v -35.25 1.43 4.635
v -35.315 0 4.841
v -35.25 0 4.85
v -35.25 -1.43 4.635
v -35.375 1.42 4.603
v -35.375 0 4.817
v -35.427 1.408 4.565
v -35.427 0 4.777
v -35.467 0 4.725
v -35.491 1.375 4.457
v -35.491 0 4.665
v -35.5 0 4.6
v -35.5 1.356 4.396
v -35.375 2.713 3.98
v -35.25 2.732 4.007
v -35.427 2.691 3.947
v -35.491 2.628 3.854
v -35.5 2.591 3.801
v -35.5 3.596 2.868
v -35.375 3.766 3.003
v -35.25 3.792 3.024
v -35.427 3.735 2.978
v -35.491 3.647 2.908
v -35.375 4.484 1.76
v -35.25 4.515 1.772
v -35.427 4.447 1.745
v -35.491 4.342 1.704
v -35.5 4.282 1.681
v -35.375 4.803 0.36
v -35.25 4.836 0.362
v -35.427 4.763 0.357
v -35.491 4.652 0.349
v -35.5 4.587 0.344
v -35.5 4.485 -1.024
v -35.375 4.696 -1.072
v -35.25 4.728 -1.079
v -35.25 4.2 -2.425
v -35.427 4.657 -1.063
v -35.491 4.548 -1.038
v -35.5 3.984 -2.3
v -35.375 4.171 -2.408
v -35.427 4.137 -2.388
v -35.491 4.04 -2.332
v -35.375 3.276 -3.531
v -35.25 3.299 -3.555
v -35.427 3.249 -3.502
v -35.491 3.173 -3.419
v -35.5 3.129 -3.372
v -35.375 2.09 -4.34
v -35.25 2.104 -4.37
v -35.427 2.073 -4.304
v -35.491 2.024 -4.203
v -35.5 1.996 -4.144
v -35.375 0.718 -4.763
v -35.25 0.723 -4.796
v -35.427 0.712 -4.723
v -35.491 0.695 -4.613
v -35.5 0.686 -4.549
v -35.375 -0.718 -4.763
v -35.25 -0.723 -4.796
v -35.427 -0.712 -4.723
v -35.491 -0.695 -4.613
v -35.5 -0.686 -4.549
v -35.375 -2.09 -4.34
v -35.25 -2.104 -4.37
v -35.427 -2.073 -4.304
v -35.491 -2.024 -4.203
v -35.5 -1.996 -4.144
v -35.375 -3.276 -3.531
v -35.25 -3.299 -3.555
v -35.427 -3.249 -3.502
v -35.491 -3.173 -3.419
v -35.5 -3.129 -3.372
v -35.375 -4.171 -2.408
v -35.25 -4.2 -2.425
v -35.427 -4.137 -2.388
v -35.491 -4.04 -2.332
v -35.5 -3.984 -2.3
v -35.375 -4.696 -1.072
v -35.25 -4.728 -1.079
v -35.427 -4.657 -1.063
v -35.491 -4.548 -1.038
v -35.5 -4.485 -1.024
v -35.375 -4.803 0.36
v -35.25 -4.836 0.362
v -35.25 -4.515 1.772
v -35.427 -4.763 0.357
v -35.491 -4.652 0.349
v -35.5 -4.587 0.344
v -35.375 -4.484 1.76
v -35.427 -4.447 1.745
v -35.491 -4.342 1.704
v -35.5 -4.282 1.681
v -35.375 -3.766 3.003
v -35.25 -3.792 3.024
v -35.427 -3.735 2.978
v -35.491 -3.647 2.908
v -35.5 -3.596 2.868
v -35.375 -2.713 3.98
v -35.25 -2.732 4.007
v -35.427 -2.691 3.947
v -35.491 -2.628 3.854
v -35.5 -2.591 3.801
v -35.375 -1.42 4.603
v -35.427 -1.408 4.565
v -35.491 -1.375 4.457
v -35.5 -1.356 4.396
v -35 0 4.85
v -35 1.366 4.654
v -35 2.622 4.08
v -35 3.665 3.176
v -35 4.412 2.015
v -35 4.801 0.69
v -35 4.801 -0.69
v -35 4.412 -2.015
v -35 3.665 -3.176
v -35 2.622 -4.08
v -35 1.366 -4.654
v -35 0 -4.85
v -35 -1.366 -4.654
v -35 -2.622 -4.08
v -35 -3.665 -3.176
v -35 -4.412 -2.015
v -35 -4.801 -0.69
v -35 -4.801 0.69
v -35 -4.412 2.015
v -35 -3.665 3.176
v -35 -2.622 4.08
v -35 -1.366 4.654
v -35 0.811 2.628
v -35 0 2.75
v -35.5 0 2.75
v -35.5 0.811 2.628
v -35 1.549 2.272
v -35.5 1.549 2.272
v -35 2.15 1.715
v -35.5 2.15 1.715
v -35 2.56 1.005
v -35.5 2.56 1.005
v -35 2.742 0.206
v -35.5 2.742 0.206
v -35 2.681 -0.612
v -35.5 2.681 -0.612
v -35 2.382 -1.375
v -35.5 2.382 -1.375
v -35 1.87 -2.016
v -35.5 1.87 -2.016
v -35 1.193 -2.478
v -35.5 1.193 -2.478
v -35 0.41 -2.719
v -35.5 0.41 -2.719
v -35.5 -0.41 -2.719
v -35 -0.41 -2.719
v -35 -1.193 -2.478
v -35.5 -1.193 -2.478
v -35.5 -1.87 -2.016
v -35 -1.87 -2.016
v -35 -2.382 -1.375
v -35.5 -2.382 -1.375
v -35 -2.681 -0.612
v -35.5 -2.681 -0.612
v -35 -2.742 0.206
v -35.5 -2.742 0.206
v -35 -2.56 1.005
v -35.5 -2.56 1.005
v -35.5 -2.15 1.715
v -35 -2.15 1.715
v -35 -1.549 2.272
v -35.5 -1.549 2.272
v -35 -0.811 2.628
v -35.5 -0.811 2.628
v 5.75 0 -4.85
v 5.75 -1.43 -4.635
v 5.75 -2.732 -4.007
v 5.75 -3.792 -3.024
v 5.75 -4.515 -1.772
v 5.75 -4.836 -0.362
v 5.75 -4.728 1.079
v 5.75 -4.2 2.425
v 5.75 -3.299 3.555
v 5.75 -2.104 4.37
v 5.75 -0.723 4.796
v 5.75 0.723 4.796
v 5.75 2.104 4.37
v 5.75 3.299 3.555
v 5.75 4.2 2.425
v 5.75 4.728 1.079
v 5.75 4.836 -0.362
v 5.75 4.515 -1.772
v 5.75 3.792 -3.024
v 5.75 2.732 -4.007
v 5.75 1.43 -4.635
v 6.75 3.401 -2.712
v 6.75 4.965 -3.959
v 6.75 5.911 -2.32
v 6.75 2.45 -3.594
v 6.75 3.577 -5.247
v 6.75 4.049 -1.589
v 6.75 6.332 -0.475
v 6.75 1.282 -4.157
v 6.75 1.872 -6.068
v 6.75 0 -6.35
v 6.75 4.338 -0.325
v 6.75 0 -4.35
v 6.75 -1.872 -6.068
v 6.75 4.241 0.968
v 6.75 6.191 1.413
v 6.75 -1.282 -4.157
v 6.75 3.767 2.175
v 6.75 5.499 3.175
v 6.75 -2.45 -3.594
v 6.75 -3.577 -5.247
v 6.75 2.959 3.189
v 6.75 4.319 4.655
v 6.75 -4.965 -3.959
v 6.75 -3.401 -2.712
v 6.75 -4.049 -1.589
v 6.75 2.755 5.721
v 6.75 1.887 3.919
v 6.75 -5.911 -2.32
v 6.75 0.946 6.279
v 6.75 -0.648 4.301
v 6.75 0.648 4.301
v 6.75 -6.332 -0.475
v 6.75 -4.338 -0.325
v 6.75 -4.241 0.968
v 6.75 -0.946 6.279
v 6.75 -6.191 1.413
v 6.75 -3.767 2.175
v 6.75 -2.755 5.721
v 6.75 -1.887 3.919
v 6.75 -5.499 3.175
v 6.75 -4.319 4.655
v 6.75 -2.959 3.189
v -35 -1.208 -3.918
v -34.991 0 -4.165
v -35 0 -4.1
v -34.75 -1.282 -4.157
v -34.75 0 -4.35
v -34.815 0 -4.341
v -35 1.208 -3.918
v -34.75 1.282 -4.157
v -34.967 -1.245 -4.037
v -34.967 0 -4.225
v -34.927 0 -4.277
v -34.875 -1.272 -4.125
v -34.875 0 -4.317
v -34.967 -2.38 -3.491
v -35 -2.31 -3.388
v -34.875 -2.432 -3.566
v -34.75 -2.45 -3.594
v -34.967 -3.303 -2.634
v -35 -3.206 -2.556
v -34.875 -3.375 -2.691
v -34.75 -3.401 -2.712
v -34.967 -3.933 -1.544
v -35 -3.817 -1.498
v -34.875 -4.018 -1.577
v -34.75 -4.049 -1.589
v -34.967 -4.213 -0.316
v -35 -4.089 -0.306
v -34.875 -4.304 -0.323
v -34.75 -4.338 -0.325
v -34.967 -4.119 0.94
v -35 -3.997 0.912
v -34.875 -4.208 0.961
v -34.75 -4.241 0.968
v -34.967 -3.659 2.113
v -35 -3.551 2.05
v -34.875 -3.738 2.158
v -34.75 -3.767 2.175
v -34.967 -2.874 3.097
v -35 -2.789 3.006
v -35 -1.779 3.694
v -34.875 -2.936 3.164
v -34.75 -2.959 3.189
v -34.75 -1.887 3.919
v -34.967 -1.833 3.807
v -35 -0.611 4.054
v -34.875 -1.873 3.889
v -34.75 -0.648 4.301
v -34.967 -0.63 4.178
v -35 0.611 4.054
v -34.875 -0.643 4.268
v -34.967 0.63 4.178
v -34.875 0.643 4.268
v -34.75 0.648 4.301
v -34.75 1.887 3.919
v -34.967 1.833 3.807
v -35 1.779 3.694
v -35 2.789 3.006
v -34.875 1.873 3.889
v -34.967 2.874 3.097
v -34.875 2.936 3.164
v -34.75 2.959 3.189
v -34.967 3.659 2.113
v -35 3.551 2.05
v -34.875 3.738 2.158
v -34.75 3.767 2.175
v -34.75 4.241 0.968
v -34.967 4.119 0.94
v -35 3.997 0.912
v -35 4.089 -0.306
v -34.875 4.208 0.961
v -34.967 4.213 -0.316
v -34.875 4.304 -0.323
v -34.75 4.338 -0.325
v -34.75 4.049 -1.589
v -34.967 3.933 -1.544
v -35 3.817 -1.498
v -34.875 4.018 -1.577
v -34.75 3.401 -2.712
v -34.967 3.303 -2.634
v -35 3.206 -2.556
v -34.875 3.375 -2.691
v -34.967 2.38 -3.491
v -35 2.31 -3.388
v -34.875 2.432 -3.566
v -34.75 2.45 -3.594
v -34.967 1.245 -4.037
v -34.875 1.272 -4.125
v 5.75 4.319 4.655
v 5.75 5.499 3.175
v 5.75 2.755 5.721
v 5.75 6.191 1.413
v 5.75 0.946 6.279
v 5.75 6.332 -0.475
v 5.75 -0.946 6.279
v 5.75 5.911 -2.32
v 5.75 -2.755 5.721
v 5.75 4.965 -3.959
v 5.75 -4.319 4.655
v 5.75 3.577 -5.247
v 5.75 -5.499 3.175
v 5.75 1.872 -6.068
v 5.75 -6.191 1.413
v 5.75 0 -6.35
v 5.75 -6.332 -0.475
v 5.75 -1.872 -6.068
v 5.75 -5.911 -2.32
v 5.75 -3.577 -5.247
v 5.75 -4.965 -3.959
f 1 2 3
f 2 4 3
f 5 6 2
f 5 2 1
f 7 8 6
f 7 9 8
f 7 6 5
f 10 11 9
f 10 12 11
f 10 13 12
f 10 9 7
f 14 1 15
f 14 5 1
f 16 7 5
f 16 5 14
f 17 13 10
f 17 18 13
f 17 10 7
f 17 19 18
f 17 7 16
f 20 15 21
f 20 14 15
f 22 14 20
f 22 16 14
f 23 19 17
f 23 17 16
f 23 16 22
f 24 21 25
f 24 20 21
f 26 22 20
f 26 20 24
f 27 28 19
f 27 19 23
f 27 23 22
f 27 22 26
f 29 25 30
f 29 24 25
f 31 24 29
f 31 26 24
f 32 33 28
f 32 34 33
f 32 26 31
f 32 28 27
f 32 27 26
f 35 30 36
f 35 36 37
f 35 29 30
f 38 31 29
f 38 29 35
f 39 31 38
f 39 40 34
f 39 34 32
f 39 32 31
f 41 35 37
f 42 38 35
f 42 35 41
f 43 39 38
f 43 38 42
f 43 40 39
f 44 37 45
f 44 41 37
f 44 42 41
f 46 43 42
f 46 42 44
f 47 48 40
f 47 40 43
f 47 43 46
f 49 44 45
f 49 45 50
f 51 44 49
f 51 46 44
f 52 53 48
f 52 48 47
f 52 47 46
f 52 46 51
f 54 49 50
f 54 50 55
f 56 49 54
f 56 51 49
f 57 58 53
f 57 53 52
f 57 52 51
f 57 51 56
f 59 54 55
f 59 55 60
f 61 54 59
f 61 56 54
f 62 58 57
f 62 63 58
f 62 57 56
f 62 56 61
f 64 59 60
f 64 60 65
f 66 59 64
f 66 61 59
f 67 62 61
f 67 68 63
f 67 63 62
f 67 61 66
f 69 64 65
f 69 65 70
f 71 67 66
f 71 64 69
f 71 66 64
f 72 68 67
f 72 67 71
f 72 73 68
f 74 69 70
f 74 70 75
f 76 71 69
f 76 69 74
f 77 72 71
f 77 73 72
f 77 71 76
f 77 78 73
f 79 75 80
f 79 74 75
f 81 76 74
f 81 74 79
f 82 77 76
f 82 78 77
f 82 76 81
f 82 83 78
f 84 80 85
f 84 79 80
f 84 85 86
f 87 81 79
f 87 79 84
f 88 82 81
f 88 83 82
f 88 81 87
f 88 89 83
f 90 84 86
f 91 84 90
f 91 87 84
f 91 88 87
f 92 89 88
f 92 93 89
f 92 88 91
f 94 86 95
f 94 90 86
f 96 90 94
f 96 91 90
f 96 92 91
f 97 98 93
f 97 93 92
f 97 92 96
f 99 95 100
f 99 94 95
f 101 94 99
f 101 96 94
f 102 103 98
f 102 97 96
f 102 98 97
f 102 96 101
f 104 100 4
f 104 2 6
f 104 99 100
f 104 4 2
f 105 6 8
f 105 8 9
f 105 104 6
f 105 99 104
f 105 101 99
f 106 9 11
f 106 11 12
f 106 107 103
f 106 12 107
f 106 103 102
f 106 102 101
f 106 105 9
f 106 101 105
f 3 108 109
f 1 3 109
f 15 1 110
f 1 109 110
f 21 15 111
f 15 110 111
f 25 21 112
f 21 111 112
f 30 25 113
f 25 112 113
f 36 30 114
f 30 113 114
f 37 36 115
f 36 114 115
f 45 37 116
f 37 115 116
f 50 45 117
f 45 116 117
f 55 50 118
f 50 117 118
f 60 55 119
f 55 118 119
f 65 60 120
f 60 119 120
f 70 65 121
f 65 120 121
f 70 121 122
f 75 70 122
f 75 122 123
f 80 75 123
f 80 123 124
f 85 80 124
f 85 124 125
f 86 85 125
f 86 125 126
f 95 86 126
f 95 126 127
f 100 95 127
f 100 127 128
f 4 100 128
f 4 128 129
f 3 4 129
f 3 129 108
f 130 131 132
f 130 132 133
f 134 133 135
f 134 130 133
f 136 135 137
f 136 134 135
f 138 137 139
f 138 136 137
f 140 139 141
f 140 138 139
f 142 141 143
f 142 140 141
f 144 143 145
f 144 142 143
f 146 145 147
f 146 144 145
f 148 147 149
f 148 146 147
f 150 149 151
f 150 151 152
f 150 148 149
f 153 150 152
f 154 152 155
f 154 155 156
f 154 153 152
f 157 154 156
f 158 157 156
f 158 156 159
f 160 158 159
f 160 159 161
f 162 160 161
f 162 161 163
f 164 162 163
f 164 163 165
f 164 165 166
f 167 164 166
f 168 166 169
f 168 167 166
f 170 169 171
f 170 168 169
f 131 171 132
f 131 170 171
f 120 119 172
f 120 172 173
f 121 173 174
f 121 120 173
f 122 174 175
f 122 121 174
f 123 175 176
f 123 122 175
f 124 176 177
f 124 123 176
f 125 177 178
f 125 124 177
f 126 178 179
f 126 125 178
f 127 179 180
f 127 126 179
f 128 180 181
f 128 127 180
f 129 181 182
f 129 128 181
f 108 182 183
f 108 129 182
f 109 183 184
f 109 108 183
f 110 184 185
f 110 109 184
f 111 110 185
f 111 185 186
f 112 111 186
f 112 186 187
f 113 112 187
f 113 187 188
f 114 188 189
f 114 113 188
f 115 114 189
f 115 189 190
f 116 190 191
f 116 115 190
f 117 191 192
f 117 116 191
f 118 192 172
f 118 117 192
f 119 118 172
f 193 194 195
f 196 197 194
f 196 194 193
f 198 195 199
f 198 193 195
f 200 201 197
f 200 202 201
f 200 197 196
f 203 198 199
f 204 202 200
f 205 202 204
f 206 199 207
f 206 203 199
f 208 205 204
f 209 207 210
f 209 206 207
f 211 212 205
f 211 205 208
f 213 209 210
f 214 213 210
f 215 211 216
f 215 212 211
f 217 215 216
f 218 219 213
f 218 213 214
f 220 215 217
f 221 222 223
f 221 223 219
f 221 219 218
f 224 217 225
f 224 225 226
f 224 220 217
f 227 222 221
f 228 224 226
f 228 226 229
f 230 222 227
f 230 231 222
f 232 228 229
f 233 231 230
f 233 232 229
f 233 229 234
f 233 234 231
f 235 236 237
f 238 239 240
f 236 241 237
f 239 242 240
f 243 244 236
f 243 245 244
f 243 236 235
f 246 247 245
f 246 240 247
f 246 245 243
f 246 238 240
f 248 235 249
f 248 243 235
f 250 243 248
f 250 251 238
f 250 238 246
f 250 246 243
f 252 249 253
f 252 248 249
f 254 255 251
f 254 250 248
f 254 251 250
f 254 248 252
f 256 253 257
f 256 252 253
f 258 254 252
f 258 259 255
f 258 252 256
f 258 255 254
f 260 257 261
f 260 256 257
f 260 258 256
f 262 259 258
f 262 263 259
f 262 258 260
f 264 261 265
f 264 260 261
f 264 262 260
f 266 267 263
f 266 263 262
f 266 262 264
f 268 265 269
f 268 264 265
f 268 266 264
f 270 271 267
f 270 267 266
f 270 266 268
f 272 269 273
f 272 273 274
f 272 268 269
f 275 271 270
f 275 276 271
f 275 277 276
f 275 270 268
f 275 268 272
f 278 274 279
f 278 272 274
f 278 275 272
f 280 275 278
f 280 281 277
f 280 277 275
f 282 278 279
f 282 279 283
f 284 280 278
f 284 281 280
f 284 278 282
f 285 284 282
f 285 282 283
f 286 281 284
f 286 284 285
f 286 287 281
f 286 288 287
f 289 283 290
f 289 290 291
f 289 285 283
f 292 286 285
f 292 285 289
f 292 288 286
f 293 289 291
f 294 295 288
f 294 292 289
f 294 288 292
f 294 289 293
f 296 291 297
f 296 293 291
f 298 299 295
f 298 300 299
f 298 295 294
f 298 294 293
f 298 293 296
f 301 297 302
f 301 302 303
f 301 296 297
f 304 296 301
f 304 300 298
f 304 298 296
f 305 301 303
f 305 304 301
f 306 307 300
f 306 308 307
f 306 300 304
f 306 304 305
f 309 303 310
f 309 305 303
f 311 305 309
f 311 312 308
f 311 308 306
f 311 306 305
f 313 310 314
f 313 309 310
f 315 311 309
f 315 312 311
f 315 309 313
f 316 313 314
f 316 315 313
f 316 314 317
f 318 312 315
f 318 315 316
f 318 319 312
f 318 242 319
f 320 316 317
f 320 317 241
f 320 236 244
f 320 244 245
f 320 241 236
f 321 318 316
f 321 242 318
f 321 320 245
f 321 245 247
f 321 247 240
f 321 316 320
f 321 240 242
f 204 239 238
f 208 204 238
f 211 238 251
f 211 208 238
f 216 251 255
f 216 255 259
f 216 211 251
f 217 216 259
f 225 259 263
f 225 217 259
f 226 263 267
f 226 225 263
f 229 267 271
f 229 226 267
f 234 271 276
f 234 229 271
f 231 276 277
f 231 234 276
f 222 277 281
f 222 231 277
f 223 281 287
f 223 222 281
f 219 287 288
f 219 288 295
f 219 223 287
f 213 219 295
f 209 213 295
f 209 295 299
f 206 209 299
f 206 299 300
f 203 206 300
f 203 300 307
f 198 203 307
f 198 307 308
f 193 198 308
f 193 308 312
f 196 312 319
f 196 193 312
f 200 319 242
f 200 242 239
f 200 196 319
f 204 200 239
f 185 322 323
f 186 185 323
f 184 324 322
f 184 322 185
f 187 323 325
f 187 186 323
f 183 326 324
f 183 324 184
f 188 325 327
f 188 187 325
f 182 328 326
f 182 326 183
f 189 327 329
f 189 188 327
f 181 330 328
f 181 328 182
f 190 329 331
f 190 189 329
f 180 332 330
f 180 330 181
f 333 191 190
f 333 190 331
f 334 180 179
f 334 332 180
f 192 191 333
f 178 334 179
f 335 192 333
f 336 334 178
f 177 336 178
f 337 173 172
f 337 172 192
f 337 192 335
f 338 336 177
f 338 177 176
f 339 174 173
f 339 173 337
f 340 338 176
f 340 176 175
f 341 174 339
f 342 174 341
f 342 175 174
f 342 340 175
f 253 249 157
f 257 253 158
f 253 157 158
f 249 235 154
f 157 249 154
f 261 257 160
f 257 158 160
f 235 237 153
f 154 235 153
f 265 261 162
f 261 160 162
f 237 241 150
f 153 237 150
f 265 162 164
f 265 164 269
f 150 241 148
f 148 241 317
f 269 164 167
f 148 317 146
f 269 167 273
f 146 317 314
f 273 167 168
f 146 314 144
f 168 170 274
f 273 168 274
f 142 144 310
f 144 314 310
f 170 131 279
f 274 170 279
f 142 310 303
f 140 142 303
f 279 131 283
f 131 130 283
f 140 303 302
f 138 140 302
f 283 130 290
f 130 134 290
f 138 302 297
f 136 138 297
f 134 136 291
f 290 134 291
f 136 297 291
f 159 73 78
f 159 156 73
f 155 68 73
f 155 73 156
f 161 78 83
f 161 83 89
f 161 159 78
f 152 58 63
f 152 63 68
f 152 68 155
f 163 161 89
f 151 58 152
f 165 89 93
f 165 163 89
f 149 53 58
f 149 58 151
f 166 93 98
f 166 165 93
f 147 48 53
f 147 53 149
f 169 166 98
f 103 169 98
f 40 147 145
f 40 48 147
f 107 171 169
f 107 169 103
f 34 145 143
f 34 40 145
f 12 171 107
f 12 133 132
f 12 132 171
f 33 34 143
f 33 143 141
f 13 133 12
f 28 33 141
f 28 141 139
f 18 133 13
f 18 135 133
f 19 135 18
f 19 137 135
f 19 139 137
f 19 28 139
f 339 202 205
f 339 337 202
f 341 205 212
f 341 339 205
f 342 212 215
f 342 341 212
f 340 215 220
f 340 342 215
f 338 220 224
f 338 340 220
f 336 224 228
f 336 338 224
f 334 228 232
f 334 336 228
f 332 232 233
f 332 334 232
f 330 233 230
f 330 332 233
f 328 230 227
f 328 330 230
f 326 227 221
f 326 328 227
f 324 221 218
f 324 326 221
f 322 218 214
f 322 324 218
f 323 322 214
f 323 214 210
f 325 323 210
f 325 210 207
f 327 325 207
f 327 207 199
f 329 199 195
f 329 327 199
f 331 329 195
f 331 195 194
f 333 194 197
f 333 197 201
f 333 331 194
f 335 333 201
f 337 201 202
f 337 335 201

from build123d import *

# Parameters (mm, degrees)
SKETCH2_R           = 4.85
SKETCH2_R_2         = 2.75
BOSS_EXTRUDE1_DEPTH = 0.5
FILLET1_R           = 0.25


with BuildPart() as part:
    # Sketch1 → Revolve1 (revolve)
    with BuildSketch(Plane(origin=(0, 0, 0), x_dir=(1, 0, 0), z_dir=(0, 1, 0))):
        Polygon((-35, 4.35), (6.75, 4.35), (6.75, 6.35), (5.75, 6.35), (5.75, 4.85), (-35, 4.85), align=None)
    revolve(axis=Axis((0, 0, 0), (-1, 0, 0)))

    # Sketch2 → Boss-Extrude1 (add)
    with BuildSketch(Plane.ZY.offset(35)):
        Circle(SKETCH2_R)
        Circle(SKETCH2_R_2, mode=Mode.SUBTRACT)
    extrude(amount=BOSS_EXTRUDE1_DEPTH)

    # Fillet1
    fillet1_edges = [part.edges().sort_by_distance(p)[0] for p in [
        (-35.5, 0, -4.85),
        (-35, 0, 4.35),
    ]]
    fillet(fillet1_edges, radius=FILLET1_R)


solid = part.part
